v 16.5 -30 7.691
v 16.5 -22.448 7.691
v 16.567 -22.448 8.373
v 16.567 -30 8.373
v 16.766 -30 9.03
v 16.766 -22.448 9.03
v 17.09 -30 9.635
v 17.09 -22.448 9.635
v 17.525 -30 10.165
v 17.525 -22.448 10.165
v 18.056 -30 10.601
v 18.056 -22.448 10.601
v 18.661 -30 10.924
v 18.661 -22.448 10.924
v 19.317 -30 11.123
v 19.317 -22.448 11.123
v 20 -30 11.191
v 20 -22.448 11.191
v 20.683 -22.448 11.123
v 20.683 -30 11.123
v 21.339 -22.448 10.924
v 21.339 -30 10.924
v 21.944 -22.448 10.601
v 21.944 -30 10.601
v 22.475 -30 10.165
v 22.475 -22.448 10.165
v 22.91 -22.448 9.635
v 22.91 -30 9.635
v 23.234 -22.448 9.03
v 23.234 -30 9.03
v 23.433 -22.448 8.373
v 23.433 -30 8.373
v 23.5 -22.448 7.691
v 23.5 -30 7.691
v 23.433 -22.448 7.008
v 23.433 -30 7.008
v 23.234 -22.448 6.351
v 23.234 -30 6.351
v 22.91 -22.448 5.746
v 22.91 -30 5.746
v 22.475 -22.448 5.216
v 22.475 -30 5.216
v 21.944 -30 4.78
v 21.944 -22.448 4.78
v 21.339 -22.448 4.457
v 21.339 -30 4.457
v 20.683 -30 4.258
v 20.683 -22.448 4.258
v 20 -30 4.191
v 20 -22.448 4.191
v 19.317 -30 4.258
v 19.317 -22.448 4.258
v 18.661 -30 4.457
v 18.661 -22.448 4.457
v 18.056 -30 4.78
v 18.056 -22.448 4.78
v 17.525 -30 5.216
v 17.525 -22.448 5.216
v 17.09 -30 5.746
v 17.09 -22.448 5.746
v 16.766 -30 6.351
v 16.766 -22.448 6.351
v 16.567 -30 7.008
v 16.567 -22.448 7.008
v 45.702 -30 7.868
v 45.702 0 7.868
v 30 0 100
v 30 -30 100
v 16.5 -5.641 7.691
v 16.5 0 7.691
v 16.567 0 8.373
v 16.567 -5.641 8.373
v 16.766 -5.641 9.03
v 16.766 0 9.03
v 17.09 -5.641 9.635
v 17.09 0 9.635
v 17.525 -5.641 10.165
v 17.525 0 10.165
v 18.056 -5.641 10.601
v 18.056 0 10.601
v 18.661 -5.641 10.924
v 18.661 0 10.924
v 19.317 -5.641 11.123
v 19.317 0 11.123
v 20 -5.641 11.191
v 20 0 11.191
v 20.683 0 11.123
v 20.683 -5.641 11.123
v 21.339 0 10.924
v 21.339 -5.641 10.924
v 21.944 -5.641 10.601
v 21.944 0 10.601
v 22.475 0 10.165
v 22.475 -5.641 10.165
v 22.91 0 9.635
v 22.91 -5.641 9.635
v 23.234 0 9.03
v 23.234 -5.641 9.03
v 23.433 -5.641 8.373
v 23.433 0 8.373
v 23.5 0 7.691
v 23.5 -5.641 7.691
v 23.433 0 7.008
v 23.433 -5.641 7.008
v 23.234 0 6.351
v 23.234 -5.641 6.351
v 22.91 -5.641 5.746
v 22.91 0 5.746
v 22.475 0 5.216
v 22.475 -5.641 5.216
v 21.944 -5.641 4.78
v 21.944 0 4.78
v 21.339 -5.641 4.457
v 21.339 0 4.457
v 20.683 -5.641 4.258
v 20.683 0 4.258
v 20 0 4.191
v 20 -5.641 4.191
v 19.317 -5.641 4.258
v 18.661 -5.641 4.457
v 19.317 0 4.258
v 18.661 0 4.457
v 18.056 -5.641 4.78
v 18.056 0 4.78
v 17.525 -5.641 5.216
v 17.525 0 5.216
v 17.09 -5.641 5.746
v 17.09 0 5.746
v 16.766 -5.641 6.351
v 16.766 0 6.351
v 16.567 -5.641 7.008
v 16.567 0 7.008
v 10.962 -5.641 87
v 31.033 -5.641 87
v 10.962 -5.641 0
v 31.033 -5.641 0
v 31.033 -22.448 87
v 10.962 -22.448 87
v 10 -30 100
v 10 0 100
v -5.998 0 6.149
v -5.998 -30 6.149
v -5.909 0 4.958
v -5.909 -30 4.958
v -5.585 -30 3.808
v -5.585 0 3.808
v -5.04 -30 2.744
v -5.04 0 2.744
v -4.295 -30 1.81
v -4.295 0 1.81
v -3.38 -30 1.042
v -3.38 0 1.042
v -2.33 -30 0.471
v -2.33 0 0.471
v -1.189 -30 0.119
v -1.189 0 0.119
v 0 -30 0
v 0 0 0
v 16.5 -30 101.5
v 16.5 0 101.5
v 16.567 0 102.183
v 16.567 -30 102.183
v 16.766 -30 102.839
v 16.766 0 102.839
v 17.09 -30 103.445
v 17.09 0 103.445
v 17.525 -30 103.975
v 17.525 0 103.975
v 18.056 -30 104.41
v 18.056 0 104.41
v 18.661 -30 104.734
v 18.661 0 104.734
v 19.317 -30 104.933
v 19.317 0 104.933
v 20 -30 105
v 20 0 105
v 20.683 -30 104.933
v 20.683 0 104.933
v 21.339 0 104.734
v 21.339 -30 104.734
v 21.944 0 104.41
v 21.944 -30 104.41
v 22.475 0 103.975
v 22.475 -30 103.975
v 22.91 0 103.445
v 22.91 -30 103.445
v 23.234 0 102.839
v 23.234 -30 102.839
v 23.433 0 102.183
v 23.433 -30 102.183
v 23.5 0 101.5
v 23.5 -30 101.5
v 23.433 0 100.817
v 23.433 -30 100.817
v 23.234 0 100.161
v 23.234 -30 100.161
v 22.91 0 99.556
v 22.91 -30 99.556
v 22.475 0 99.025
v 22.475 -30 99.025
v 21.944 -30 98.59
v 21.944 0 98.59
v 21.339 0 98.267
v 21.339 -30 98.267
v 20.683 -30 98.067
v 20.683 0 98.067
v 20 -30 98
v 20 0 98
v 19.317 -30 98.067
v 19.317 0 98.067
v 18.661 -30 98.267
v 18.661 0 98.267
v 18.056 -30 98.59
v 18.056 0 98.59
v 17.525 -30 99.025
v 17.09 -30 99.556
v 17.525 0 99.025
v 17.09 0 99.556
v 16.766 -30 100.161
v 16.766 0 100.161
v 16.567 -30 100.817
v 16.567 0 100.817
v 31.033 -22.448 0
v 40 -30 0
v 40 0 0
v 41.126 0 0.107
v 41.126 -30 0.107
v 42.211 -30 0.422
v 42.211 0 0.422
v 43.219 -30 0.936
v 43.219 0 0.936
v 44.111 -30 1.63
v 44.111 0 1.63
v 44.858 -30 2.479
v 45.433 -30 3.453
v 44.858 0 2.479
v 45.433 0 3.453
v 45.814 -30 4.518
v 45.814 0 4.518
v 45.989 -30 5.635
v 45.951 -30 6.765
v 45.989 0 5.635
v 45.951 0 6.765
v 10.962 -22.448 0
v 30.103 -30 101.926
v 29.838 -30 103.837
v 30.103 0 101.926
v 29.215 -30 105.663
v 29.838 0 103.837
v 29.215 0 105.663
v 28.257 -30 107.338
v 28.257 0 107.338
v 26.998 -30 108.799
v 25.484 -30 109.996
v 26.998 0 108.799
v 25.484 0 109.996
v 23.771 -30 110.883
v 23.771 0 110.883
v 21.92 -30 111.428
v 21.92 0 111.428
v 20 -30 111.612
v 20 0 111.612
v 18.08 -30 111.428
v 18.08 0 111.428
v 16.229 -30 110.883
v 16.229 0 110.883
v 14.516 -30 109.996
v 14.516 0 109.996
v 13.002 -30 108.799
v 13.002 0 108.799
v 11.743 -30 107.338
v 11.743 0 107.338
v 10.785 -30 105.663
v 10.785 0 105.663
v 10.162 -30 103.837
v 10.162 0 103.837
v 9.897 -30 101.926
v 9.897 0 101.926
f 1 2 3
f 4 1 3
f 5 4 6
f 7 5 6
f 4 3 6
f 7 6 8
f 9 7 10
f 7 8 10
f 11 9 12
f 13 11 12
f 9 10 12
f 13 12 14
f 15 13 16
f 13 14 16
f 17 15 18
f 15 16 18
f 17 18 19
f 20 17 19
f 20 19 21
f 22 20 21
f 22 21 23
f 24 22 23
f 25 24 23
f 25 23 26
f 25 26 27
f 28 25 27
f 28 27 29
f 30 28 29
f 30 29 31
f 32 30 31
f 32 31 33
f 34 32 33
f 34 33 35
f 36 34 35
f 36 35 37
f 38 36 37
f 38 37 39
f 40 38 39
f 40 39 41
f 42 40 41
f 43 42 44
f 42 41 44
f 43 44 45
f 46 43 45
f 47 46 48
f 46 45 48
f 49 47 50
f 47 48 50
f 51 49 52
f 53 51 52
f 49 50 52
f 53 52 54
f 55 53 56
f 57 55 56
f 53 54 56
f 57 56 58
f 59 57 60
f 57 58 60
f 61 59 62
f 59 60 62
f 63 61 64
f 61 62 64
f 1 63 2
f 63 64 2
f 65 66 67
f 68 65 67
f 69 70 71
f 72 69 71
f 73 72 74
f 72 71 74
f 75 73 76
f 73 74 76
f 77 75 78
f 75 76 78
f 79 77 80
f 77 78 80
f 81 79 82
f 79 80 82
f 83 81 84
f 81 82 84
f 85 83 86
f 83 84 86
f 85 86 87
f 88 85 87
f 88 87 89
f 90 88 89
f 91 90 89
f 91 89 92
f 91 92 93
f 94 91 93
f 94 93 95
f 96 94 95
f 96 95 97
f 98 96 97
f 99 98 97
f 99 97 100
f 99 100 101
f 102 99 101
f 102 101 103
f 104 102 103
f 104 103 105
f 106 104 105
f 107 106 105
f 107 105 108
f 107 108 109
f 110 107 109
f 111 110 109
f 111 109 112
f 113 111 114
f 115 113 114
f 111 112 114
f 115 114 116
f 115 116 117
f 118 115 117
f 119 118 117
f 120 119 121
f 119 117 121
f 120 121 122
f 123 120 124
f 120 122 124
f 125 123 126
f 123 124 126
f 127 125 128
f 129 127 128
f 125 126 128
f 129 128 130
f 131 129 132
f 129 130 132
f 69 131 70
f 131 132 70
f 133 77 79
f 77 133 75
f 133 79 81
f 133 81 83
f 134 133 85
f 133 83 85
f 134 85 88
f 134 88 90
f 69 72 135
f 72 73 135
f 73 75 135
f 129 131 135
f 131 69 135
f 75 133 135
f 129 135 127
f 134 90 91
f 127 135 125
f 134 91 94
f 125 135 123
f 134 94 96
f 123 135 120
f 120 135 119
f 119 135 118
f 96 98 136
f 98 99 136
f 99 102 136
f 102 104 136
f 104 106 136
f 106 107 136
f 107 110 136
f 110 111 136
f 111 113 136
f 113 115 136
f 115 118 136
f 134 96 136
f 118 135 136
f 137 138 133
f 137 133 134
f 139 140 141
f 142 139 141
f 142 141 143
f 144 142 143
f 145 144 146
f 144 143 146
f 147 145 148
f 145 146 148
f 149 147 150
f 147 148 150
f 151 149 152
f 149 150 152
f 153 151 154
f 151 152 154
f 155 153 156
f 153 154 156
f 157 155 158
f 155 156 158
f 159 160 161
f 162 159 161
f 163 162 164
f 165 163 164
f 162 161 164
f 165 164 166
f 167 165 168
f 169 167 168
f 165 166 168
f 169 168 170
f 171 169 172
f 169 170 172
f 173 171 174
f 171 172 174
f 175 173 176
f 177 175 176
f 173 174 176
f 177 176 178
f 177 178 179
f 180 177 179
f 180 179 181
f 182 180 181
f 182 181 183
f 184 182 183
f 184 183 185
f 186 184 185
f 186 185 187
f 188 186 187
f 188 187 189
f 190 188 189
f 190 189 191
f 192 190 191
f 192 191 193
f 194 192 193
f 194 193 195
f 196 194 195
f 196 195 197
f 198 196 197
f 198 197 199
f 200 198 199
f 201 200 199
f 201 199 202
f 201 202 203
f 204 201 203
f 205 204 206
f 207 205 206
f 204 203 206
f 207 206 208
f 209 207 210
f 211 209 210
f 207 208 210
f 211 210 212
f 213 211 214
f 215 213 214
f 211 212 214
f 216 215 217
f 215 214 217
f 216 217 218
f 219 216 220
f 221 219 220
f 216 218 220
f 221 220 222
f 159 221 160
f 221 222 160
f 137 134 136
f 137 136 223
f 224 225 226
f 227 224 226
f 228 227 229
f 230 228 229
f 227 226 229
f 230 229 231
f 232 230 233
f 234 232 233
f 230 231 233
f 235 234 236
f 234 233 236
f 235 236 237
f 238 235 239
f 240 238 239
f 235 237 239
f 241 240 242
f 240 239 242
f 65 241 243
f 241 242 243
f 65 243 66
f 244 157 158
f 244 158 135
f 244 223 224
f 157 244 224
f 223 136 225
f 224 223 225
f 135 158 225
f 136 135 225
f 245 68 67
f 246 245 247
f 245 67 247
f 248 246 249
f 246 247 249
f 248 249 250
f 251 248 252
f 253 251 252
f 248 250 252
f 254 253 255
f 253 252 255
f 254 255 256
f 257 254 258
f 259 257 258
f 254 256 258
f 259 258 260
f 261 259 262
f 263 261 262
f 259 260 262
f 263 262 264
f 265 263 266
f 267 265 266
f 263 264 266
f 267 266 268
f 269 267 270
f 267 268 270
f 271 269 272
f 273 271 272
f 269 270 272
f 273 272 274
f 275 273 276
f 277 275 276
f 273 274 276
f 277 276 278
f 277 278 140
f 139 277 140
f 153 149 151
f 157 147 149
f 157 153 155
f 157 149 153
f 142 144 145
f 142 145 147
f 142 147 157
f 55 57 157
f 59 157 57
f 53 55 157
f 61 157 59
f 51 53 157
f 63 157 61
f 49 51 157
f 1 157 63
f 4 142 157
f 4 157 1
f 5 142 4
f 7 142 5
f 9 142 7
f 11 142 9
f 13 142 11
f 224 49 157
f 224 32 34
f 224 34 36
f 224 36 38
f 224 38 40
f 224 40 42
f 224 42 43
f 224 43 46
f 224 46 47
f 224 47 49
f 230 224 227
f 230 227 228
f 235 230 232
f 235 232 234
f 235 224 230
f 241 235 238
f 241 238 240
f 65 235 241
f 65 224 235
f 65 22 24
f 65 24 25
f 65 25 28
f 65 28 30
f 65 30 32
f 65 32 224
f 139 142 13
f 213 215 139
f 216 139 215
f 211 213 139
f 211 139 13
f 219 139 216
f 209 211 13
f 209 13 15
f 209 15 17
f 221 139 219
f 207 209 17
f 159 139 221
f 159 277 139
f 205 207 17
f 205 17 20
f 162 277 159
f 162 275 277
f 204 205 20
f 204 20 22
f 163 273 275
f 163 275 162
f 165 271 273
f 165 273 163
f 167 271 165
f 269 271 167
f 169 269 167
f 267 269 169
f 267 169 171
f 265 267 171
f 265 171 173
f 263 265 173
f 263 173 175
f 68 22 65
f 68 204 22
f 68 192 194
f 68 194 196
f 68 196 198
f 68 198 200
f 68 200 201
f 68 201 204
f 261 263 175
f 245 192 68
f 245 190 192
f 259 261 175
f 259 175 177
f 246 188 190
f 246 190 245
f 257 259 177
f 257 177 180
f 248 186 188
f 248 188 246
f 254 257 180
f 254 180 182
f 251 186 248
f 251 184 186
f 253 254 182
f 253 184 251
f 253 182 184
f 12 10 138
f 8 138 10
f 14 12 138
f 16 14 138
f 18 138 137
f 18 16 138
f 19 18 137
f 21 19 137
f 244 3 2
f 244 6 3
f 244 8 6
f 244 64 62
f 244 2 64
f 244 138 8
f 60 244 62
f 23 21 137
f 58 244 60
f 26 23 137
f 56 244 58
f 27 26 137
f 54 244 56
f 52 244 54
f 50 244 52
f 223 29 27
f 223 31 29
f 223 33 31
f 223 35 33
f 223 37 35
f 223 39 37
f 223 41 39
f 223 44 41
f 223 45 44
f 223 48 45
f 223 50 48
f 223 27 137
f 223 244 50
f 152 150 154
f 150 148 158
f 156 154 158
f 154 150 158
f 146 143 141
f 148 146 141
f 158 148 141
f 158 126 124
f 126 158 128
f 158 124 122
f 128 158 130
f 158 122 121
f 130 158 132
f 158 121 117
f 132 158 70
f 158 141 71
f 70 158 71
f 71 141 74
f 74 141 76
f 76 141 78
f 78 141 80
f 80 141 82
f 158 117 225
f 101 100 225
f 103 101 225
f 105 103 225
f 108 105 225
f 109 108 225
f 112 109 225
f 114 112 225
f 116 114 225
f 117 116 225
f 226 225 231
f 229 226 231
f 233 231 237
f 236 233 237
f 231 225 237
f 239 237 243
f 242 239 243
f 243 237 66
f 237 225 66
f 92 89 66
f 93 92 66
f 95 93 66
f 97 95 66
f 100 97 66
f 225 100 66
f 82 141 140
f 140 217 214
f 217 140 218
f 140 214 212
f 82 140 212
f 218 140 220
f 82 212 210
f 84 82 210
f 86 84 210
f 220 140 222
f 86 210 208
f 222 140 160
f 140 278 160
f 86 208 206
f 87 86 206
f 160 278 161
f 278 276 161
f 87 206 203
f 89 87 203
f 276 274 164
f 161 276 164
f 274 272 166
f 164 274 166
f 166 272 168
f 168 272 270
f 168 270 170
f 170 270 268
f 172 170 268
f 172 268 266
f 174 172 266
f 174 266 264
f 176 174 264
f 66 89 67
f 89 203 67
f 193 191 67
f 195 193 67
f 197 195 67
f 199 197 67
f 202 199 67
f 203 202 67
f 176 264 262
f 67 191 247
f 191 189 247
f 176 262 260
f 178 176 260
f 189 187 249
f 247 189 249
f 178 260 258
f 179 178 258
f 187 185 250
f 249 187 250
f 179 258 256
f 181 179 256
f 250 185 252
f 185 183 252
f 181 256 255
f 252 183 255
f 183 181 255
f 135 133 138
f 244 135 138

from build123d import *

# Parameters (mm, degrees)
F1_DEPTH = 30
F3_D     = 7
F5_D     = 7
F6_W     = 20.071618259
F6_H     = 16.8062914163
F7_DEPTH = 87


with BuildPart() as f1:
    # F0 (on Front) → F1 (new body)
    with BuildSketch(Plane.XZ):
        with BuildLine():
            ThreePointArc((-5.9981474183, 6.1490890598), (-4.2950281931, 1.8104018307), (0, 0))
            Line((0, 0), (40, 0))
            ThreePointArc((40, 0), (44.8583417204, 2.4791313959), (45.7018609438, 7.8678280909))
            Line((45.7018609438, 7.8678280909), (30, 100))
            Line((30, 100), (20, 100))
            Line((20, 100), (10, 100))
            Line((10, 100), (-5.9981474183, 6.1490890598))
        make_face()
        with BuildLine():
            ThreePointArc((30, 100), (20, 111.6119907276), (10, 100))
            Line((10, 100), (20, 100))
            Line((20, 100), (30, 100))
        make_face()
    extrude(amount=F1_DEPTH)

    # F3 (through all)
    with Locations(Plane.XZ.offset(30)):
        with Locations((20, 7.6905470341)):
            Hole(F3_D / 2)

    # F5 (through all)
    with Locations(Plane.XZ.offset(30)):
        with Locations((20, 101.5001014674)):
            Hole(F5_D / 2)

    # F6 (on face) → F7 (cut)
    with BuildSketch(Plane(origin=(0, 0, 0), x_dir=(1, 0, 0), z_dir=(0, 0, -1))):
        with Locations((20.9973212332, 14.0443919227)):
            Rectangle(F6_W, F6_H)
    extrude(amount=-F7_DEPTH, mode=Mode.SUBTRACT)


solid = f1.part
